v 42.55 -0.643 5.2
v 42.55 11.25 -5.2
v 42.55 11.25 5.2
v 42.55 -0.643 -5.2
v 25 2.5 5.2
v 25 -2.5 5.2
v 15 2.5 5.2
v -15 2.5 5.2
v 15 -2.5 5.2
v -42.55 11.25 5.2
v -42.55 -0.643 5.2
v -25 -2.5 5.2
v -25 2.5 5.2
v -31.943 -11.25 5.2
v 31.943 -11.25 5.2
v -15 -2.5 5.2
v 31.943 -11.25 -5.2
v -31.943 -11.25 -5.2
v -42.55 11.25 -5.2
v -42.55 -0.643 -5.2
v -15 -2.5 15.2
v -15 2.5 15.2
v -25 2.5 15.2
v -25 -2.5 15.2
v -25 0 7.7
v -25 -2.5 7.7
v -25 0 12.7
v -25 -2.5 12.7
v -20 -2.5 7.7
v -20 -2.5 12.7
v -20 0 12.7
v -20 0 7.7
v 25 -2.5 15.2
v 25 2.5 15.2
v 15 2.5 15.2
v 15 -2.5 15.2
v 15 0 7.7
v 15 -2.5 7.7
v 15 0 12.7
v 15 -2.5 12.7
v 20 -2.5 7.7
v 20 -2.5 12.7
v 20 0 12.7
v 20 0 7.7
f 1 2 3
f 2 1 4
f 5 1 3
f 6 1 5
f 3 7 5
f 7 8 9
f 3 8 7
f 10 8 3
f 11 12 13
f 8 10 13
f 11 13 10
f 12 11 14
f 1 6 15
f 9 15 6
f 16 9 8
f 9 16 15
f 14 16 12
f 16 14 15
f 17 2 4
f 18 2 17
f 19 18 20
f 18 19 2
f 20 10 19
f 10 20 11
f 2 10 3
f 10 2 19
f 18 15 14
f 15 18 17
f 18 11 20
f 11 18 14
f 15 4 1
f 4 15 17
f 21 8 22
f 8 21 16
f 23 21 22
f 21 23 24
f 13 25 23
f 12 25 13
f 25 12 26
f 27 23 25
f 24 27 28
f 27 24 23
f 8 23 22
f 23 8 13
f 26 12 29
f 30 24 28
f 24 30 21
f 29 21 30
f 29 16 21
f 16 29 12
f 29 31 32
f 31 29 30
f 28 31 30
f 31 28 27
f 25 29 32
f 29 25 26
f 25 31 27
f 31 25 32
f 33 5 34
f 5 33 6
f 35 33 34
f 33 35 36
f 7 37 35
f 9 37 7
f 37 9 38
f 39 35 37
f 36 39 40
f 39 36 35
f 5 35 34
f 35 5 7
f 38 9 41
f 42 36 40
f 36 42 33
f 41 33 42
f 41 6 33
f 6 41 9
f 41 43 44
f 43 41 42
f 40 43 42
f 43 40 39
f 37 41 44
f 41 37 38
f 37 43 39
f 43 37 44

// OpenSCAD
module chamfered_bar() {
    difference() {
        cube([85.1, 22.5, 10.4], center = true);
        translate([-42.55, -11.25, 0])
            rotate([0, 0, 45])
            cube([15, 15, 10.4], center = true);
        translate([42.55, -11.25, 0])
            rotate([0, 0, 45])
            cube([15, 15, 10.4], center = true);
    }
}

module prong() {
    difference() {
        cube([10, 5, 20], center = true);
        translate([-5, -2.5, 5])
            cube([10, 5, 5], center = true);
    }
}

module bracket() {
    chamfered_bar();
    translate([-20, 0, 5.2])
        prong();
    translate([20, 0, 5.2])
        prong();
}

bracket();
